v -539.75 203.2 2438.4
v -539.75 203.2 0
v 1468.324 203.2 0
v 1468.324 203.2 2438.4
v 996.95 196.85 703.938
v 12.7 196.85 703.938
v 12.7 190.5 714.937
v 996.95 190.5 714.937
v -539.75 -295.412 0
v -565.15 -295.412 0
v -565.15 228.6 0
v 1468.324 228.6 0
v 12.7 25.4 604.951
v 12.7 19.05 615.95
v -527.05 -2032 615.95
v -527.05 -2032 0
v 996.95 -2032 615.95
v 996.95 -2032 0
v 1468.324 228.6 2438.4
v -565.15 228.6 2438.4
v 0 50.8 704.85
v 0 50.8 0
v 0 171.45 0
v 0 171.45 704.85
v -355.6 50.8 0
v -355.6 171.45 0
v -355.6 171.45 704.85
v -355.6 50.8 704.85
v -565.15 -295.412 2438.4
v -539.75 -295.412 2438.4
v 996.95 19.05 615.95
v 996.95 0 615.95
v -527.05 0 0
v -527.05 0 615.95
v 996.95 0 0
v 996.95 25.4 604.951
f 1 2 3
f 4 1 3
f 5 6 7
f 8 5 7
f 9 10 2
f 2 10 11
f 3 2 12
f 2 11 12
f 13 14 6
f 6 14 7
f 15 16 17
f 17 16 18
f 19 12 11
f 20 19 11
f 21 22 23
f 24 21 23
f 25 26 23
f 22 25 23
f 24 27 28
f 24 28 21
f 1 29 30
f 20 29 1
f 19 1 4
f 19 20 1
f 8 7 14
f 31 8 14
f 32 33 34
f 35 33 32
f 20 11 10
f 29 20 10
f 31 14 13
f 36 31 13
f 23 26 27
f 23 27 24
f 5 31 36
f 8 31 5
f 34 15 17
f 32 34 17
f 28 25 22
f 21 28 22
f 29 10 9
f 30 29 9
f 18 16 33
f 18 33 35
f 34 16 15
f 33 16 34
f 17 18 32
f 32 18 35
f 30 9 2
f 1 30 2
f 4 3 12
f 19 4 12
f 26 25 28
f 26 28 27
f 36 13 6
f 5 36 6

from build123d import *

# Parameters (mm, degrees)
F0_W     = 355.6
F0_H     = 120.65
F1_DEPTH = 704.85
F3_DEPTH = 2438.4
F4_W     = 1524
F4_H     = 2032
F5_DEPTH = 615.95
F7_START = 12.7
F7_DEPTH = 984.25


with BuildPart() as f1:
    # F0 (on Top) → F1 (new body)
    with BuildSketch(Plane.XY):
        with Locations((-177.8, 111.125)):
            Rectangle(F0_W, F0_H)
    extrude(amount=F1_DEPTH)


with BuildPart() as f3:
    # F2 (on Top) → F3 (new body)
    with BuildSketch(Plane.XY):
        Polygon((-565.15, -295.4117953777), (-539.75, -295.4117953777), (-539.75, 203.2), (1468.3241844177, 203.2), (1468.3241844177, 228.6), (-565.15, 228.6), align=None)
    extrude(amount=F3_DEPTH)


with BuildPart() as f5:
    # F4 (on Top) → F5 (new body)
    with BuildSketch(Plane.XY):
        with Locations((234.95, -1016)):
            Rectangle(F4_W, F4_H)
    extrude(amount=F5_DEPTH)


with BuildPart() as f7:
    # F6 (on Right) → F7 (new body)
    with BuildSketch(Plane.YZ.offset(F7_START)):
        Polygon((190.5, 714.9367036526), (19.05, 615.95), (25.4, 604.9514773719), (196.85, 703.9381810245), align=None)
    extrude(amount=F7_DEPTH)


solid = Compound([f1.part, f3.part, f5.part, f7.part])
